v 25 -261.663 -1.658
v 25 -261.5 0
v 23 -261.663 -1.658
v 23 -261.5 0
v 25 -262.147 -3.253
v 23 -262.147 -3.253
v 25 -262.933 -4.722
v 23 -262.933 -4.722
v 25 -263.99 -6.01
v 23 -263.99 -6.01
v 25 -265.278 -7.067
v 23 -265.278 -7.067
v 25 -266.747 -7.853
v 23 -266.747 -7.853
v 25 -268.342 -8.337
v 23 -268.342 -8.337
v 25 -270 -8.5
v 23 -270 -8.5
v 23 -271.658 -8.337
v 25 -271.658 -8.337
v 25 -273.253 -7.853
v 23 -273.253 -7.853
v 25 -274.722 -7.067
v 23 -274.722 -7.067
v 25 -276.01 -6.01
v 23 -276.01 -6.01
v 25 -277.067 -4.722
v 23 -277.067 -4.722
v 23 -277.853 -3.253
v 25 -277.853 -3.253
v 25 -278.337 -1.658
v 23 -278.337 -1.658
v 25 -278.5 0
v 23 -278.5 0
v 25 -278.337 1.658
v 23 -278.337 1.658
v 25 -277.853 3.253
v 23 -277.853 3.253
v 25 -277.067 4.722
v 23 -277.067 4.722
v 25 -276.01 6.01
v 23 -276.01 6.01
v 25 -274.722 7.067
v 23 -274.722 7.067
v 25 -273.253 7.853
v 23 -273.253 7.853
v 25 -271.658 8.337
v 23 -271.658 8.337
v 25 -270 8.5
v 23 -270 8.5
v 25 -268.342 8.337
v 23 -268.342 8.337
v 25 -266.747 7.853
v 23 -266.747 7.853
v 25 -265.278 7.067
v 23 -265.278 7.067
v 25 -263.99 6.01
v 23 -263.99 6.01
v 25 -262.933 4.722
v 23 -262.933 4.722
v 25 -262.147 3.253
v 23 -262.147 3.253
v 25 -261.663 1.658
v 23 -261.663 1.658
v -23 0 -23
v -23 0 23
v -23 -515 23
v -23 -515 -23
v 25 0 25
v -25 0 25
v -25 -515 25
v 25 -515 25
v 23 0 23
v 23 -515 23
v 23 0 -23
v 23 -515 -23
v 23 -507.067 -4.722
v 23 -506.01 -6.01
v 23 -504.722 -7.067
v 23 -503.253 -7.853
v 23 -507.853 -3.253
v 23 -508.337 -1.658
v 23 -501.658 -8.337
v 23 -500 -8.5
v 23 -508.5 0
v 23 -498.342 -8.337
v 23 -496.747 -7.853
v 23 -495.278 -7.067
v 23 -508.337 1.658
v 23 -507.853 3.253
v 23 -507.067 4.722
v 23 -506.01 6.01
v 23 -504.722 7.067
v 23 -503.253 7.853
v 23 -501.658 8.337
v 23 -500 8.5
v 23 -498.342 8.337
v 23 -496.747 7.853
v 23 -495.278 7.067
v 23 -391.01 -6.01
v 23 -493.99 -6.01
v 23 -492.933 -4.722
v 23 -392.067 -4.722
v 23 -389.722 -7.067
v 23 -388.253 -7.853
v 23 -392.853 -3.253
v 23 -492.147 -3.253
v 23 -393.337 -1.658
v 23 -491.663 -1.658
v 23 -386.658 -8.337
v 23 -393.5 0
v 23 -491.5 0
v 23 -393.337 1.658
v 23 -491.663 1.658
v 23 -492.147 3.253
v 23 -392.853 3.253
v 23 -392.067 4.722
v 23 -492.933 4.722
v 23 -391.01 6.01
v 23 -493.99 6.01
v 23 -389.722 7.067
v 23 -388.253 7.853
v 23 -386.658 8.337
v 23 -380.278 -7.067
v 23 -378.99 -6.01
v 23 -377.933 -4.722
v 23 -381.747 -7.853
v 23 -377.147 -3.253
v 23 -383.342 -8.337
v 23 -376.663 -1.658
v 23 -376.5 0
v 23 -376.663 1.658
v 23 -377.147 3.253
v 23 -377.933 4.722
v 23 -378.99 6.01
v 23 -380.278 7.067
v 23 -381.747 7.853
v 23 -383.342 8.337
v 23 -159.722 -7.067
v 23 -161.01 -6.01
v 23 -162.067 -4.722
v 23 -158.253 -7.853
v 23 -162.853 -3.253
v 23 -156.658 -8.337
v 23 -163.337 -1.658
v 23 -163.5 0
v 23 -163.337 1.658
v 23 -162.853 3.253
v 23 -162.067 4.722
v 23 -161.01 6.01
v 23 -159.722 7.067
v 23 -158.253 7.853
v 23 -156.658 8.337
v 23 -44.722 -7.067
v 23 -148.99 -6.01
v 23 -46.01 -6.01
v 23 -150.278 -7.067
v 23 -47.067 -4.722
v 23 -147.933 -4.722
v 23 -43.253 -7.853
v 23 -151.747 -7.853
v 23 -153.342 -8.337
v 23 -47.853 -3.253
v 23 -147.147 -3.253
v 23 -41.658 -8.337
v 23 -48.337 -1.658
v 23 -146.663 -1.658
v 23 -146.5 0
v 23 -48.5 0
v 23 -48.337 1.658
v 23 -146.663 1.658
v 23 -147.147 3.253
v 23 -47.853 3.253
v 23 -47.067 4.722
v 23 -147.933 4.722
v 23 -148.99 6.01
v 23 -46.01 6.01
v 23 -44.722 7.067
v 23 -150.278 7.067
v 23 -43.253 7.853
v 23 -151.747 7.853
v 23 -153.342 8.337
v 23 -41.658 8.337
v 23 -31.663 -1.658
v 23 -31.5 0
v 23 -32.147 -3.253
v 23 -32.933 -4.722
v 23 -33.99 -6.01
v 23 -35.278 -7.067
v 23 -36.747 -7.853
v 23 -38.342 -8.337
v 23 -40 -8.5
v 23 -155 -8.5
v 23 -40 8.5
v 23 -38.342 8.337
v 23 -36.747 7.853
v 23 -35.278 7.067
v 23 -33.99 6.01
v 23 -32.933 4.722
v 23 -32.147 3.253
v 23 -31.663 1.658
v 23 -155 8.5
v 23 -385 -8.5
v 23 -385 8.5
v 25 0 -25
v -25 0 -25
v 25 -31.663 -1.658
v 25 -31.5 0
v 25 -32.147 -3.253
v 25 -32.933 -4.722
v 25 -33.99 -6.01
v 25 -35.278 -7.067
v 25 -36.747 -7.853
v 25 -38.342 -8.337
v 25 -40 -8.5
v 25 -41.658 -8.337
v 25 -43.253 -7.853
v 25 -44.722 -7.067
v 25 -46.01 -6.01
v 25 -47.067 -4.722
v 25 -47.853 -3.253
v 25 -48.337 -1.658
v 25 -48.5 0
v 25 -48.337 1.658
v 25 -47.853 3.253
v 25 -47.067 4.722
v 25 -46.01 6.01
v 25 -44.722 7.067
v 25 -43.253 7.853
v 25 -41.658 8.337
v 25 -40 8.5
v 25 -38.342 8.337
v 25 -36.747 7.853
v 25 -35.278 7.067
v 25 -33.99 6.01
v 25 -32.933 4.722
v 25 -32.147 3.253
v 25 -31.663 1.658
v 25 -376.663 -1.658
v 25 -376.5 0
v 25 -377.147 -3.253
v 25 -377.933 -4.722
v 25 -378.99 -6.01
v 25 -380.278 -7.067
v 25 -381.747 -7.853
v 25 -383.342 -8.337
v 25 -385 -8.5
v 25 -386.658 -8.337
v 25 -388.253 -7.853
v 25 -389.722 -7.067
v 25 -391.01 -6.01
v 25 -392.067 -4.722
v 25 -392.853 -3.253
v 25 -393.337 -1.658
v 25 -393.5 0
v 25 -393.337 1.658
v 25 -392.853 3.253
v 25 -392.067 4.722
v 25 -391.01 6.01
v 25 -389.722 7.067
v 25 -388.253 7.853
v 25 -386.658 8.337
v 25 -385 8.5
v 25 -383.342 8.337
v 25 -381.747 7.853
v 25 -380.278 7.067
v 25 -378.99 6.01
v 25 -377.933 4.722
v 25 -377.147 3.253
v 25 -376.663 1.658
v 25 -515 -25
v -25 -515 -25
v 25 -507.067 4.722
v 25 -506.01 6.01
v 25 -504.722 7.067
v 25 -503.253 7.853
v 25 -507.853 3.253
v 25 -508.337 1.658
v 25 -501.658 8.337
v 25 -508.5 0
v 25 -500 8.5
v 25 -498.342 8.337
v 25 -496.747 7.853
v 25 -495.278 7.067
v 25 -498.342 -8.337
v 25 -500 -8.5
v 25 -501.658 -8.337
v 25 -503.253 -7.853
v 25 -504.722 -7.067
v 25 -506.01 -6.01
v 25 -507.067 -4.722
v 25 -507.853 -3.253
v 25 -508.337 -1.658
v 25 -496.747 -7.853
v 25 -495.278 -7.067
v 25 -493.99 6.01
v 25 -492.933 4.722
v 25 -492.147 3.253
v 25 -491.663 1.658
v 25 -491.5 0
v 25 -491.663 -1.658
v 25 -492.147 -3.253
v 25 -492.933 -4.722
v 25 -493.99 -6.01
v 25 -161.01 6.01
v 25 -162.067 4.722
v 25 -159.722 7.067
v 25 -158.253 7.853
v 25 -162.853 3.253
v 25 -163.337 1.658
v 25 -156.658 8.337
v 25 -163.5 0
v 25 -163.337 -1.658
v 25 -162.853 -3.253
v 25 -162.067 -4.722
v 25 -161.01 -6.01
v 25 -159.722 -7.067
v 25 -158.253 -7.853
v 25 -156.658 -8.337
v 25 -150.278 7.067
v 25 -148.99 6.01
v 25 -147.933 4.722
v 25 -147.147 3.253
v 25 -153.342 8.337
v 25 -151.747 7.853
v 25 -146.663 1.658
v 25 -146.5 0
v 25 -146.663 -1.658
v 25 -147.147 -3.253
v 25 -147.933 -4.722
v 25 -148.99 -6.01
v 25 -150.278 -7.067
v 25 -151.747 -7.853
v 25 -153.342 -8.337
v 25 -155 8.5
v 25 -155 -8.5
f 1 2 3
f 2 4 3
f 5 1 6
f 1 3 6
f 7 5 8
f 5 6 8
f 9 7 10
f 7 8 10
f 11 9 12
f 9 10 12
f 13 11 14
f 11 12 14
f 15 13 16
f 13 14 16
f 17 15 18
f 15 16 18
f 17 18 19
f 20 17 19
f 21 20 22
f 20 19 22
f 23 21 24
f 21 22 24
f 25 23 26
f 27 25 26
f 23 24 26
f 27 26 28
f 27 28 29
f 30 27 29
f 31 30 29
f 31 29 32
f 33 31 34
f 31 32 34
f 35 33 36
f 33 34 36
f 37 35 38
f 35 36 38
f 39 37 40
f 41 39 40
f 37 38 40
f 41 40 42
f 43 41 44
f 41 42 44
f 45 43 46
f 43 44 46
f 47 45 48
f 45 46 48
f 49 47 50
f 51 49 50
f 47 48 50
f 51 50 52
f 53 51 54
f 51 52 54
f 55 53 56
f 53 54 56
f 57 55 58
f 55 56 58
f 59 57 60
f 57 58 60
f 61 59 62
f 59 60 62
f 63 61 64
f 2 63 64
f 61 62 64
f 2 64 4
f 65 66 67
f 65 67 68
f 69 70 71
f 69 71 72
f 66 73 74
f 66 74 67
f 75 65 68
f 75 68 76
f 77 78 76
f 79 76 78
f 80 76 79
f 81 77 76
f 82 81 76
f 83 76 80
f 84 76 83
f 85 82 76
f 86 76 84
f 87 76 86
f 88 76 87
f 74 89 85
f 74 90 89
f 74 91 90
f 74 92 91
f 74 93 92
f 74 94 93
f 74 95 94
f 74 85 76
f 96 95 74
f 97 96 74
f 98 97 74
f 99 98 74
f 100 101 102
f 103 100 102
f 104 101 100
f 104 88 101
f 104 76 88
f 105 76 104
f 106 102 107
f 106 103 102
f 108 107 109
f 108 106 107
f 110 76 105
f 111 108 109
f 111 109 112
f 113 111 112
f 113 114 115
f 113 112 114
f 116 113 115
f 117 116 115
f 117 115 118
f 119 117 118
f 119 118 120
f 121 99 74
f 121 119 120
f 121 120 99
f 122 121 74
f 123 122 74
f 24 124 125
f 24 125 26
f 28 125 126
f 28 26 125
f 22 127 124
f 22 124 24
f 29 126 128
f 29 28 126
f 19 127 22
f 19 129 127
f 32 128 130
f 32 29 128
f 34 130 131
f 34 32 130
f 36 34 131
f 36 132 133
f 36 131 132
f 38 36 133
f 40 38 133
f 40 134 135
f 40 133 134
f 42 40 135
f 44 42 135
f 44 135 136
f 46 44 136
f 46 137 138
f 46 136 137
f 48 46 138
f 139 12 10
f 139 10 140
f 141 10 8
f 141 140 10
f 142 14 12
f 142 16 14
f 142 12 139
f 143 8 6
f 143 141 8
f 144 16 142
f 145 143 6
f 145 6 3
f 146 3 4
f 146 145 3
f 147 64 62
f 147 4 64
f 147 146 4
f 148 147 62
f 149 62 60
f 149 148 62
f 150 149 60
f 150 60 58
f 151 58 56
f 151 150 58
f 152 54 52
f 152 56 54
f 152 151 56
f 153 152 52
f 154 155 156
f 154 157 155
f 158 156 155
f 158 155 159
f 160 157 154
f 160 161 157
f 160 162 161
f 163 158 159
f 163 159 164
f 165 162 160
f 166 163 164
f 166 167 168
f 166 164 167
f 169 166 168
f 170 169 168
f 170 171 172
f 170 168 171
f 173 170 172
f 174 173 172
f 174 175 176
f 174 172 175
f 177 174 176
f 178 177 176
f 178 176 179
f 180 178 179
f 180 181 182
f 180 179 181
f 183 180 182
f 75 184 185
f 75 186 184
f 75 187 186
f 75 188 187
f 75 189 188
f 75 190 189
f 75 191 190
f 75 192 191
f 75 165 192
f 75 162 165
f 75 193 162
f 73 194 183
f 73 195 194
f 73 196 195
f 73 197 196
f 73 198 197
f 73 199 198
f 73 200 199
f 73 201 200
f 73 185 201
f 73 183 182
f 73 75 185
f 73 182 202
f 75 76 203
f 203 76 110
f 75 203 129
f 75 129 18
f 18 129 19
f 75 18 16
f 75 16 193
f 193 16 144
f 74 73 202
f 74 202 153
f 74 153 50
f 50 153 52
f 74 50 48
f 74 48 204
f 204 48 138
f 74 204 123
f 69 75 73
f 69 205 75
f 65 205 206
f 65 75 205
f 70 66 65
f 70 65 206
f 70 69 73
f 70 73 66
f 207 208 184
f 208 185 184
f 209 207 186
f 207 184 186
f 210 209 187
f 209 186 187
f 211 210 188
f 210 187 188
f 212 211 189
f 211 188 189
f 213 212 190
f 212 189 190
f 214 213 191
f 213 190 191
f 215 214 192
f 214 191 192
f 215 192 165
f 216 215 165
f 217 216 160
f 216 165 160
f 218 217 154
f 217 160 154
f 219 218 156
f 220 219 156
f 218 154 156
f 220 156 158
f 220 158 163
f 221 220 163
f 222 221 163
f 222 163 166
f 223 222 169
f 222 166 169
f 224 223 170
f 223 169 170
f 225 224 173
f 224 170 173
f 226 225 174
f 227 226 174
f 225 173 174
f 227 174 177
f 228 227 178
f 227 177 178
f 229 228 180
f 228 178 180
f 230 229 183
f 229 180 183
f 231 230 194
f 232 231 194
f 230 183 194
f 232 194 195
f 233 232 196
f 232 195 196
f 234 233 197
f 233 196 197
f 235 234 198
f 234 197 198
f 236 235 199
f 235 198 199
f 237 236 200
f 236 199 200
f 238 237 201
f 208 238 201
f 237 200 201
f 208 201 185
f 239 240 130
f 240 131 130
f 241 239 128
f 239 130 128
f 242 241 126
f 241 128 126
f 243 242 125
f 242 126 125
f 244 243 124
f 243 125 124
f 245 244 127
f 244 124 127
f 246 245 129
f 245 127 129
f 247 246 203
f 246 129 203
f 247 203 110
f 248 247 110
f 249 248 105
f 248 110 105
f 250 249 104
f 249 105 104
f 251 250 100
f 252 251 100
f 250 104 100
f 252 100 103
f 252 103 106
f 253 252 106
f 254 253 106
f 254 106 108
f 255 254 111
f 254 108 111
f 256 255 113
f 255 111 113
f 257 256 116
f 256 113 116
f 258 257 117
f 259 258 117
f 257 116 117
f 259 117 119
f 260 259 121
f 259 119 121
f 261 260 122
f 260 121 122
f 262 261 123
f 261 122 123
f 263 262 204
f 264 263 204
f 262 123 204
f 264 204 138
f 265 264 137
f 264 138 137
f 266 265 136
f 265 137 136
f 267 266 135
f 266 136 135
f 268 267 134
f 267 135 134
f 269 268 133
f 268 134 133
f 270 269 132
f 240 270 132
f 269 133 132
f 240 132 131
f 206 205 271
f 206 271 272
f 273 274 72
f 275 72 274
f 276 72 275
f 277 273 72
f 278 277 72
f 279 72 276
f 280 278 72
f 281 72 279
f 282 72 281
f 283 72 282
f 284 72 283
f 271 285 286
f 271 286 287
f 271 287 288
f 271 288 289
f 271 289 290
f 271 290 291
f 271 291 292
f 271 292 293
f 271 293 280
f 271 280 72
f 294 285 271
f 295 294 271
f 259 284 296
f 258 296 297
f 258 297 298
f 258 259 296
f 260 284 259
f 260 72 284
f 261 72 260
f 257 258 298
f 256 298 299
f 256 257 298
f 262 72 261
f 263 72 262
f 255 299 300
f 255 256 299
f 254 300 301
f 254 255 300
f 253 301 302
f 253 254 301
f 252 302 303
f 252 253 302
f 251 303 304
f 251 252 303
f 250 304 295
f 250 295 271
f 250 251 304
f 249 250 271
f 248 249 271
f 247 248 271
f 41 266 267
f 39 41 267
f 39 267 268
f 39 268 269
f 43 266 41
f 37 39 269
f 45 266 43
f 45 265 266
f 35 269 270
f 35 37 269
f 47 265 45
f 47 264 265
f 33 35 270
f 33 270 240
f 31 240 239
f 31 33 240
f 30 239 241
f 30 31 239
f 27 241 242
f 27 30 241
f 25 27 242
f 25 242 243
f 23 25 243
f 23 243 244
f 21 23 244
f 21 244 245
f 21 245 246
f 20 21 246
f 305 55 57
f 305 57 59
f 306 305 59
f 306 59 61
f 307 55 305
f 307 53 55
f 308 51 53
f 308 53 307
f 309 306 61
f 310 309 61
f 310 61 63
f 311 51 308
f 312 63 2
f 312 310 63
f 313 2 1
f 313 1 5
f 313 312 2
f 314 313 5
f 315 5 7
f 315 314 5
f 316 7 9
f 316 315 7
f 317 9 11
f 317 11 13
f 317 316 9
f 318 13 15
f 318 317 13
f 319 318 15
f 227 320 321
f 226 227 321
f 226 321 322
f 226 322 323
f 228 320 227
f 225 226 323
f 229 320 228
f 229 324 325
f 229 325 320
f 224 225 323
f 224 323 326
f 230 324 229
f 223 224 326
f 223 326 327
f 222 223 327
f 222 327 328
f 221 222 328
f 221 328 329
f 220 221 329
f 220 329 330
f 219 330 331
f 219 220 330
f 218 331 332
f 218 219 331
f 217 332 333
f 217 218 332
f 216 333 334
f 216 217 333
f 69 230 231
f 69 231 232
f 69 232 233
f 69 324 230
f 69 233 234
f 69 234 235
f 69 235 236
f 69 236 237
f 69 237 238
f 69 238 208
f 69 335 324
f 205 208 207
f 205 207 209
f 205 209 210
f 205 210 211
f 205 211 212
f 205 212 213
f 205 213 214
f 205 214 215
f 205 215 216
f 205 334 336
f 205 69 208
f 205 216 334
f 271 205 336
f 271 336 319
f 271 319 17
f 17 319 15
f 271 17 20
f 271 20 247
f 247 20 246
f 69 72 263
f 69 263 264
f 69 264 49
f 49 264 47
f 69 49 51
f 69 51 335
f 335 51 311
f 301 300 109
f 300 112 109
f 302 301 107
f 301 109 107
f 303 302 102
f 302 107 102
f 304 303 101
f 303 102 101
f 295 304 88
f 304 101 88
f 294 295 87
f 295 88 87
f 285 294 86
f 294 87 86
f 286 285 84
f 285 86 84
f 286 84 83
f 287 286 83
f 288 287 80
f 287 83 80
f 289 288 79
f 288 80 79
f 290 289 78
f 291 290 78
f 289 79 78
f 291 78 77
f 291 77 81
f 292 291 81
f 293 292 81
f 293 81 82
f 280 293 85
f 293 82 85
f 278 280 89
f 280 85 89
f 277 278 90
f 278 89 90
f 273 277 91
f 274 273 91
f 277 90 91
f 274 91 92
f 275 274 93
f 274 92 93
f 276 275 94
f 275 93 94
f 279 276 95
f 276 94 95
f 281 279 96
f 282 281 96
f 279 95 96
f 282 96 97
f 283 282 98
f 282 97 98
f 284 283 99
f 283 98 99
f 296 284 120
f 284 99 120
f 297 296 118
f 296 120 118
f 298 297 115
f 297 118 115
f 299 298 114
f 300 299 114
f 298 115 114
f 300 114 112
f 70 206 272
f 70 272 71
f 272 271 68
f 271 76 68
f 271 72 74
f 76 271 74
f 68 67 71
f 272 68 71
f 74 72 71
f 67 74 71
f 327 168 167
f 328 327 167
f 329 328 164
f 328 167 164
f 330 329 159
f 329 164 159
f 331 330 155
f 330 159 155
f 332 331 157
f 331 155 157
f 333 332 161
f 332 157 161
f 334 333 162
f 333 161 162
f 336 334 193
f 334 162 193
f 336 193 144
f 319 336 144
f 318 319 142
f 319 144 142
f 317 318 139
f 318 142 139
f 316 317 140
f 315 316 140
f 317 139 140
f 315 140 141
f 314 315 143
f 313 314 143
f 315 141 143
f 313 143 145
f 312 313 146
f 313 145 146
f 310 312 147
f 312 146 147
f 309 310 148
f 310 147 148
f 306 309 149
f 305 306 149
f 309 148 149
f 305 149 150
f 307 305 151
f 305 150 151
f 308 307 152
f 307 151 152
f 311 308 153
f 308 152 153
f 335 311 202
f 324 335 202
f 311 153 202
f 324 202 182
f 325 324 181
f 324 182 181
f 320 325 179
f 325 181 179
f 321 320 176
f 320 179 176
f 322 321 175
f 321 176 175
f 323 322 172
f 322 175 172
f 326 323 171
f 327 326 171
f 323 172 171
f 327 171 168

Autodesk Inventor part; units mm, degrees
ref_plane "YZ Plane" through (0, 0, 0) normal (1, 0, 0) x (0, 1, 0)
ref_plane "XZ Plane" through (0, 0, 0) normal (0, 1, 0) x (-1, 0, 0)
ref_plane "XY Plane" through (0, 0, 0) normal (0, 0, 1) x (1, 0, 0)
sketch "Sketch9" plane through (0, 0, 0) normal (0, 1, 0) x (-1, 0, 0)
  line L0 (25, 25) -> (-25, 25)
  line L1 (-25, 25) -> (-25, -25)
  line L2 (-25, -25) -> (25, -25)
  line L3 (25, -25) -> (25, 25)
  line L4 (25, 25) -> (-25, -25) construction
  line L5 (-25, 25) -> (25, -25) construction
  line L6 (-23, 23) -> (23, 23)
  line L7 (23, 23) -> (23, -23)
  line L8 (23, -23) -> (-23, -23)
  line L9 (-23, -23) -> (-23, 23)
  point P0 (0, 0)
  dimension "d172" = 50
  dimension "d173" = 50
  dimension "d174" = 2
extrude "Extrusion3" add sketch "Sketch9" against normal blind 515
sketch "Sketch10" plane through (0, 0, 0) normal (1, 0, 0) x (0, 1, 0)
  line L0 (0, 25) -> (0, -25) construction
  line L1 (0, 25) -> (-515, 25) construction
  line L2 (-515, -25) -> (-515, 25) construction
  line L3 (0, -25) -> (-515, -25) construction
  line L4 (-48.5, 8.5) -> (-31.5, 8.5)
  line L5 (-31.5, 8.5) -> (-31.5, -8.5)
  line L6 (-31.5, -8.5) -> (-48.5, -8.5)
  line L7 (-48.5, -8.5) -> (-48.5, 8.5)
  line L8 (-48.5, 8.5) -> (-31.5, -8.5) construction
  line L9 (-31.5, 8.5) -> (-48.5, -8.5) construction
  line L10 (-163.5, 8.5) -> (-146.5, 8.5)
  line L11 (-146.5, 8.5) -> (-146.5, -8.5)
  line L12 (-146.5, -8.5) -> (-163.5, -8.5)
  line L13 (-163.5, -8.5) -> (-163.5, 8.5)
  line L14 (-163.5, 8.5) -> (-146.5, -8.5) construction
  line L15 (-146.5, 8.5) -> (-163.5, -8.5) construction
  line L16 (-278.5, 8.5) -> (-261.5, 8.5)
  line L17 (-261.5, 8.5) -> (-261.5, -8.5)
  line L18 (-261.5, -8.5) -> (-278.5, -8.5)
  line L19 (-278.5, -8.5) -> (-278.5, 8.5)
  line L20 (-278.5, 8.5) -> (-261.5, -8.5) construction
  line L21 (-261.5, 8.5) -> (-278.5, -8.5) construction
  circle A0 centre (-500, 0) radius 8.5
  line L22 (0, 0) -> (40, 0)
  circle A1 centre (-40, 0) radius 8.5
  circle A2 centre (-155, 0) radius 8.5
  circle A3 centre (-270, 0) radius 8.5
  line L23 (-376.5, -8.5) -> (-393.5, -8.5)
  line L24 (-393.5, -8.5) -> (-393.5, 8.5)
  line L25 (-393.5, 8.5) -> (-376.5, 8.5)
  line L26 (-376.5, 8.5) -> (-376.5, -8.5)
  line L27 (-376.5, -8.5) -> (-393.5, 8.5) construction
  line L28 (-393.5, -8.5) -> (-376.5, 8.5) construction
  circle A4 centre (-385, 0) radius 8.5
  dimension "d177" = 17
  dimension "d178" = 17
  dimension "d181" = 40
  dimension "d182" = 80
  dimension "d185" = 540
  dimension "d186" = 17
  dimension "d188" = 460
  dimension "d189" = 115
  dimension "d190" = 115
  dimension "d191" = 115
extrude "Extrusion4" cut sketch "Sketch10" along normal through all contours A1 | A2 | A3 | A0 | A4
properties part number "TKS 3511 FDS way tube 7" material "Stainless Steel"
